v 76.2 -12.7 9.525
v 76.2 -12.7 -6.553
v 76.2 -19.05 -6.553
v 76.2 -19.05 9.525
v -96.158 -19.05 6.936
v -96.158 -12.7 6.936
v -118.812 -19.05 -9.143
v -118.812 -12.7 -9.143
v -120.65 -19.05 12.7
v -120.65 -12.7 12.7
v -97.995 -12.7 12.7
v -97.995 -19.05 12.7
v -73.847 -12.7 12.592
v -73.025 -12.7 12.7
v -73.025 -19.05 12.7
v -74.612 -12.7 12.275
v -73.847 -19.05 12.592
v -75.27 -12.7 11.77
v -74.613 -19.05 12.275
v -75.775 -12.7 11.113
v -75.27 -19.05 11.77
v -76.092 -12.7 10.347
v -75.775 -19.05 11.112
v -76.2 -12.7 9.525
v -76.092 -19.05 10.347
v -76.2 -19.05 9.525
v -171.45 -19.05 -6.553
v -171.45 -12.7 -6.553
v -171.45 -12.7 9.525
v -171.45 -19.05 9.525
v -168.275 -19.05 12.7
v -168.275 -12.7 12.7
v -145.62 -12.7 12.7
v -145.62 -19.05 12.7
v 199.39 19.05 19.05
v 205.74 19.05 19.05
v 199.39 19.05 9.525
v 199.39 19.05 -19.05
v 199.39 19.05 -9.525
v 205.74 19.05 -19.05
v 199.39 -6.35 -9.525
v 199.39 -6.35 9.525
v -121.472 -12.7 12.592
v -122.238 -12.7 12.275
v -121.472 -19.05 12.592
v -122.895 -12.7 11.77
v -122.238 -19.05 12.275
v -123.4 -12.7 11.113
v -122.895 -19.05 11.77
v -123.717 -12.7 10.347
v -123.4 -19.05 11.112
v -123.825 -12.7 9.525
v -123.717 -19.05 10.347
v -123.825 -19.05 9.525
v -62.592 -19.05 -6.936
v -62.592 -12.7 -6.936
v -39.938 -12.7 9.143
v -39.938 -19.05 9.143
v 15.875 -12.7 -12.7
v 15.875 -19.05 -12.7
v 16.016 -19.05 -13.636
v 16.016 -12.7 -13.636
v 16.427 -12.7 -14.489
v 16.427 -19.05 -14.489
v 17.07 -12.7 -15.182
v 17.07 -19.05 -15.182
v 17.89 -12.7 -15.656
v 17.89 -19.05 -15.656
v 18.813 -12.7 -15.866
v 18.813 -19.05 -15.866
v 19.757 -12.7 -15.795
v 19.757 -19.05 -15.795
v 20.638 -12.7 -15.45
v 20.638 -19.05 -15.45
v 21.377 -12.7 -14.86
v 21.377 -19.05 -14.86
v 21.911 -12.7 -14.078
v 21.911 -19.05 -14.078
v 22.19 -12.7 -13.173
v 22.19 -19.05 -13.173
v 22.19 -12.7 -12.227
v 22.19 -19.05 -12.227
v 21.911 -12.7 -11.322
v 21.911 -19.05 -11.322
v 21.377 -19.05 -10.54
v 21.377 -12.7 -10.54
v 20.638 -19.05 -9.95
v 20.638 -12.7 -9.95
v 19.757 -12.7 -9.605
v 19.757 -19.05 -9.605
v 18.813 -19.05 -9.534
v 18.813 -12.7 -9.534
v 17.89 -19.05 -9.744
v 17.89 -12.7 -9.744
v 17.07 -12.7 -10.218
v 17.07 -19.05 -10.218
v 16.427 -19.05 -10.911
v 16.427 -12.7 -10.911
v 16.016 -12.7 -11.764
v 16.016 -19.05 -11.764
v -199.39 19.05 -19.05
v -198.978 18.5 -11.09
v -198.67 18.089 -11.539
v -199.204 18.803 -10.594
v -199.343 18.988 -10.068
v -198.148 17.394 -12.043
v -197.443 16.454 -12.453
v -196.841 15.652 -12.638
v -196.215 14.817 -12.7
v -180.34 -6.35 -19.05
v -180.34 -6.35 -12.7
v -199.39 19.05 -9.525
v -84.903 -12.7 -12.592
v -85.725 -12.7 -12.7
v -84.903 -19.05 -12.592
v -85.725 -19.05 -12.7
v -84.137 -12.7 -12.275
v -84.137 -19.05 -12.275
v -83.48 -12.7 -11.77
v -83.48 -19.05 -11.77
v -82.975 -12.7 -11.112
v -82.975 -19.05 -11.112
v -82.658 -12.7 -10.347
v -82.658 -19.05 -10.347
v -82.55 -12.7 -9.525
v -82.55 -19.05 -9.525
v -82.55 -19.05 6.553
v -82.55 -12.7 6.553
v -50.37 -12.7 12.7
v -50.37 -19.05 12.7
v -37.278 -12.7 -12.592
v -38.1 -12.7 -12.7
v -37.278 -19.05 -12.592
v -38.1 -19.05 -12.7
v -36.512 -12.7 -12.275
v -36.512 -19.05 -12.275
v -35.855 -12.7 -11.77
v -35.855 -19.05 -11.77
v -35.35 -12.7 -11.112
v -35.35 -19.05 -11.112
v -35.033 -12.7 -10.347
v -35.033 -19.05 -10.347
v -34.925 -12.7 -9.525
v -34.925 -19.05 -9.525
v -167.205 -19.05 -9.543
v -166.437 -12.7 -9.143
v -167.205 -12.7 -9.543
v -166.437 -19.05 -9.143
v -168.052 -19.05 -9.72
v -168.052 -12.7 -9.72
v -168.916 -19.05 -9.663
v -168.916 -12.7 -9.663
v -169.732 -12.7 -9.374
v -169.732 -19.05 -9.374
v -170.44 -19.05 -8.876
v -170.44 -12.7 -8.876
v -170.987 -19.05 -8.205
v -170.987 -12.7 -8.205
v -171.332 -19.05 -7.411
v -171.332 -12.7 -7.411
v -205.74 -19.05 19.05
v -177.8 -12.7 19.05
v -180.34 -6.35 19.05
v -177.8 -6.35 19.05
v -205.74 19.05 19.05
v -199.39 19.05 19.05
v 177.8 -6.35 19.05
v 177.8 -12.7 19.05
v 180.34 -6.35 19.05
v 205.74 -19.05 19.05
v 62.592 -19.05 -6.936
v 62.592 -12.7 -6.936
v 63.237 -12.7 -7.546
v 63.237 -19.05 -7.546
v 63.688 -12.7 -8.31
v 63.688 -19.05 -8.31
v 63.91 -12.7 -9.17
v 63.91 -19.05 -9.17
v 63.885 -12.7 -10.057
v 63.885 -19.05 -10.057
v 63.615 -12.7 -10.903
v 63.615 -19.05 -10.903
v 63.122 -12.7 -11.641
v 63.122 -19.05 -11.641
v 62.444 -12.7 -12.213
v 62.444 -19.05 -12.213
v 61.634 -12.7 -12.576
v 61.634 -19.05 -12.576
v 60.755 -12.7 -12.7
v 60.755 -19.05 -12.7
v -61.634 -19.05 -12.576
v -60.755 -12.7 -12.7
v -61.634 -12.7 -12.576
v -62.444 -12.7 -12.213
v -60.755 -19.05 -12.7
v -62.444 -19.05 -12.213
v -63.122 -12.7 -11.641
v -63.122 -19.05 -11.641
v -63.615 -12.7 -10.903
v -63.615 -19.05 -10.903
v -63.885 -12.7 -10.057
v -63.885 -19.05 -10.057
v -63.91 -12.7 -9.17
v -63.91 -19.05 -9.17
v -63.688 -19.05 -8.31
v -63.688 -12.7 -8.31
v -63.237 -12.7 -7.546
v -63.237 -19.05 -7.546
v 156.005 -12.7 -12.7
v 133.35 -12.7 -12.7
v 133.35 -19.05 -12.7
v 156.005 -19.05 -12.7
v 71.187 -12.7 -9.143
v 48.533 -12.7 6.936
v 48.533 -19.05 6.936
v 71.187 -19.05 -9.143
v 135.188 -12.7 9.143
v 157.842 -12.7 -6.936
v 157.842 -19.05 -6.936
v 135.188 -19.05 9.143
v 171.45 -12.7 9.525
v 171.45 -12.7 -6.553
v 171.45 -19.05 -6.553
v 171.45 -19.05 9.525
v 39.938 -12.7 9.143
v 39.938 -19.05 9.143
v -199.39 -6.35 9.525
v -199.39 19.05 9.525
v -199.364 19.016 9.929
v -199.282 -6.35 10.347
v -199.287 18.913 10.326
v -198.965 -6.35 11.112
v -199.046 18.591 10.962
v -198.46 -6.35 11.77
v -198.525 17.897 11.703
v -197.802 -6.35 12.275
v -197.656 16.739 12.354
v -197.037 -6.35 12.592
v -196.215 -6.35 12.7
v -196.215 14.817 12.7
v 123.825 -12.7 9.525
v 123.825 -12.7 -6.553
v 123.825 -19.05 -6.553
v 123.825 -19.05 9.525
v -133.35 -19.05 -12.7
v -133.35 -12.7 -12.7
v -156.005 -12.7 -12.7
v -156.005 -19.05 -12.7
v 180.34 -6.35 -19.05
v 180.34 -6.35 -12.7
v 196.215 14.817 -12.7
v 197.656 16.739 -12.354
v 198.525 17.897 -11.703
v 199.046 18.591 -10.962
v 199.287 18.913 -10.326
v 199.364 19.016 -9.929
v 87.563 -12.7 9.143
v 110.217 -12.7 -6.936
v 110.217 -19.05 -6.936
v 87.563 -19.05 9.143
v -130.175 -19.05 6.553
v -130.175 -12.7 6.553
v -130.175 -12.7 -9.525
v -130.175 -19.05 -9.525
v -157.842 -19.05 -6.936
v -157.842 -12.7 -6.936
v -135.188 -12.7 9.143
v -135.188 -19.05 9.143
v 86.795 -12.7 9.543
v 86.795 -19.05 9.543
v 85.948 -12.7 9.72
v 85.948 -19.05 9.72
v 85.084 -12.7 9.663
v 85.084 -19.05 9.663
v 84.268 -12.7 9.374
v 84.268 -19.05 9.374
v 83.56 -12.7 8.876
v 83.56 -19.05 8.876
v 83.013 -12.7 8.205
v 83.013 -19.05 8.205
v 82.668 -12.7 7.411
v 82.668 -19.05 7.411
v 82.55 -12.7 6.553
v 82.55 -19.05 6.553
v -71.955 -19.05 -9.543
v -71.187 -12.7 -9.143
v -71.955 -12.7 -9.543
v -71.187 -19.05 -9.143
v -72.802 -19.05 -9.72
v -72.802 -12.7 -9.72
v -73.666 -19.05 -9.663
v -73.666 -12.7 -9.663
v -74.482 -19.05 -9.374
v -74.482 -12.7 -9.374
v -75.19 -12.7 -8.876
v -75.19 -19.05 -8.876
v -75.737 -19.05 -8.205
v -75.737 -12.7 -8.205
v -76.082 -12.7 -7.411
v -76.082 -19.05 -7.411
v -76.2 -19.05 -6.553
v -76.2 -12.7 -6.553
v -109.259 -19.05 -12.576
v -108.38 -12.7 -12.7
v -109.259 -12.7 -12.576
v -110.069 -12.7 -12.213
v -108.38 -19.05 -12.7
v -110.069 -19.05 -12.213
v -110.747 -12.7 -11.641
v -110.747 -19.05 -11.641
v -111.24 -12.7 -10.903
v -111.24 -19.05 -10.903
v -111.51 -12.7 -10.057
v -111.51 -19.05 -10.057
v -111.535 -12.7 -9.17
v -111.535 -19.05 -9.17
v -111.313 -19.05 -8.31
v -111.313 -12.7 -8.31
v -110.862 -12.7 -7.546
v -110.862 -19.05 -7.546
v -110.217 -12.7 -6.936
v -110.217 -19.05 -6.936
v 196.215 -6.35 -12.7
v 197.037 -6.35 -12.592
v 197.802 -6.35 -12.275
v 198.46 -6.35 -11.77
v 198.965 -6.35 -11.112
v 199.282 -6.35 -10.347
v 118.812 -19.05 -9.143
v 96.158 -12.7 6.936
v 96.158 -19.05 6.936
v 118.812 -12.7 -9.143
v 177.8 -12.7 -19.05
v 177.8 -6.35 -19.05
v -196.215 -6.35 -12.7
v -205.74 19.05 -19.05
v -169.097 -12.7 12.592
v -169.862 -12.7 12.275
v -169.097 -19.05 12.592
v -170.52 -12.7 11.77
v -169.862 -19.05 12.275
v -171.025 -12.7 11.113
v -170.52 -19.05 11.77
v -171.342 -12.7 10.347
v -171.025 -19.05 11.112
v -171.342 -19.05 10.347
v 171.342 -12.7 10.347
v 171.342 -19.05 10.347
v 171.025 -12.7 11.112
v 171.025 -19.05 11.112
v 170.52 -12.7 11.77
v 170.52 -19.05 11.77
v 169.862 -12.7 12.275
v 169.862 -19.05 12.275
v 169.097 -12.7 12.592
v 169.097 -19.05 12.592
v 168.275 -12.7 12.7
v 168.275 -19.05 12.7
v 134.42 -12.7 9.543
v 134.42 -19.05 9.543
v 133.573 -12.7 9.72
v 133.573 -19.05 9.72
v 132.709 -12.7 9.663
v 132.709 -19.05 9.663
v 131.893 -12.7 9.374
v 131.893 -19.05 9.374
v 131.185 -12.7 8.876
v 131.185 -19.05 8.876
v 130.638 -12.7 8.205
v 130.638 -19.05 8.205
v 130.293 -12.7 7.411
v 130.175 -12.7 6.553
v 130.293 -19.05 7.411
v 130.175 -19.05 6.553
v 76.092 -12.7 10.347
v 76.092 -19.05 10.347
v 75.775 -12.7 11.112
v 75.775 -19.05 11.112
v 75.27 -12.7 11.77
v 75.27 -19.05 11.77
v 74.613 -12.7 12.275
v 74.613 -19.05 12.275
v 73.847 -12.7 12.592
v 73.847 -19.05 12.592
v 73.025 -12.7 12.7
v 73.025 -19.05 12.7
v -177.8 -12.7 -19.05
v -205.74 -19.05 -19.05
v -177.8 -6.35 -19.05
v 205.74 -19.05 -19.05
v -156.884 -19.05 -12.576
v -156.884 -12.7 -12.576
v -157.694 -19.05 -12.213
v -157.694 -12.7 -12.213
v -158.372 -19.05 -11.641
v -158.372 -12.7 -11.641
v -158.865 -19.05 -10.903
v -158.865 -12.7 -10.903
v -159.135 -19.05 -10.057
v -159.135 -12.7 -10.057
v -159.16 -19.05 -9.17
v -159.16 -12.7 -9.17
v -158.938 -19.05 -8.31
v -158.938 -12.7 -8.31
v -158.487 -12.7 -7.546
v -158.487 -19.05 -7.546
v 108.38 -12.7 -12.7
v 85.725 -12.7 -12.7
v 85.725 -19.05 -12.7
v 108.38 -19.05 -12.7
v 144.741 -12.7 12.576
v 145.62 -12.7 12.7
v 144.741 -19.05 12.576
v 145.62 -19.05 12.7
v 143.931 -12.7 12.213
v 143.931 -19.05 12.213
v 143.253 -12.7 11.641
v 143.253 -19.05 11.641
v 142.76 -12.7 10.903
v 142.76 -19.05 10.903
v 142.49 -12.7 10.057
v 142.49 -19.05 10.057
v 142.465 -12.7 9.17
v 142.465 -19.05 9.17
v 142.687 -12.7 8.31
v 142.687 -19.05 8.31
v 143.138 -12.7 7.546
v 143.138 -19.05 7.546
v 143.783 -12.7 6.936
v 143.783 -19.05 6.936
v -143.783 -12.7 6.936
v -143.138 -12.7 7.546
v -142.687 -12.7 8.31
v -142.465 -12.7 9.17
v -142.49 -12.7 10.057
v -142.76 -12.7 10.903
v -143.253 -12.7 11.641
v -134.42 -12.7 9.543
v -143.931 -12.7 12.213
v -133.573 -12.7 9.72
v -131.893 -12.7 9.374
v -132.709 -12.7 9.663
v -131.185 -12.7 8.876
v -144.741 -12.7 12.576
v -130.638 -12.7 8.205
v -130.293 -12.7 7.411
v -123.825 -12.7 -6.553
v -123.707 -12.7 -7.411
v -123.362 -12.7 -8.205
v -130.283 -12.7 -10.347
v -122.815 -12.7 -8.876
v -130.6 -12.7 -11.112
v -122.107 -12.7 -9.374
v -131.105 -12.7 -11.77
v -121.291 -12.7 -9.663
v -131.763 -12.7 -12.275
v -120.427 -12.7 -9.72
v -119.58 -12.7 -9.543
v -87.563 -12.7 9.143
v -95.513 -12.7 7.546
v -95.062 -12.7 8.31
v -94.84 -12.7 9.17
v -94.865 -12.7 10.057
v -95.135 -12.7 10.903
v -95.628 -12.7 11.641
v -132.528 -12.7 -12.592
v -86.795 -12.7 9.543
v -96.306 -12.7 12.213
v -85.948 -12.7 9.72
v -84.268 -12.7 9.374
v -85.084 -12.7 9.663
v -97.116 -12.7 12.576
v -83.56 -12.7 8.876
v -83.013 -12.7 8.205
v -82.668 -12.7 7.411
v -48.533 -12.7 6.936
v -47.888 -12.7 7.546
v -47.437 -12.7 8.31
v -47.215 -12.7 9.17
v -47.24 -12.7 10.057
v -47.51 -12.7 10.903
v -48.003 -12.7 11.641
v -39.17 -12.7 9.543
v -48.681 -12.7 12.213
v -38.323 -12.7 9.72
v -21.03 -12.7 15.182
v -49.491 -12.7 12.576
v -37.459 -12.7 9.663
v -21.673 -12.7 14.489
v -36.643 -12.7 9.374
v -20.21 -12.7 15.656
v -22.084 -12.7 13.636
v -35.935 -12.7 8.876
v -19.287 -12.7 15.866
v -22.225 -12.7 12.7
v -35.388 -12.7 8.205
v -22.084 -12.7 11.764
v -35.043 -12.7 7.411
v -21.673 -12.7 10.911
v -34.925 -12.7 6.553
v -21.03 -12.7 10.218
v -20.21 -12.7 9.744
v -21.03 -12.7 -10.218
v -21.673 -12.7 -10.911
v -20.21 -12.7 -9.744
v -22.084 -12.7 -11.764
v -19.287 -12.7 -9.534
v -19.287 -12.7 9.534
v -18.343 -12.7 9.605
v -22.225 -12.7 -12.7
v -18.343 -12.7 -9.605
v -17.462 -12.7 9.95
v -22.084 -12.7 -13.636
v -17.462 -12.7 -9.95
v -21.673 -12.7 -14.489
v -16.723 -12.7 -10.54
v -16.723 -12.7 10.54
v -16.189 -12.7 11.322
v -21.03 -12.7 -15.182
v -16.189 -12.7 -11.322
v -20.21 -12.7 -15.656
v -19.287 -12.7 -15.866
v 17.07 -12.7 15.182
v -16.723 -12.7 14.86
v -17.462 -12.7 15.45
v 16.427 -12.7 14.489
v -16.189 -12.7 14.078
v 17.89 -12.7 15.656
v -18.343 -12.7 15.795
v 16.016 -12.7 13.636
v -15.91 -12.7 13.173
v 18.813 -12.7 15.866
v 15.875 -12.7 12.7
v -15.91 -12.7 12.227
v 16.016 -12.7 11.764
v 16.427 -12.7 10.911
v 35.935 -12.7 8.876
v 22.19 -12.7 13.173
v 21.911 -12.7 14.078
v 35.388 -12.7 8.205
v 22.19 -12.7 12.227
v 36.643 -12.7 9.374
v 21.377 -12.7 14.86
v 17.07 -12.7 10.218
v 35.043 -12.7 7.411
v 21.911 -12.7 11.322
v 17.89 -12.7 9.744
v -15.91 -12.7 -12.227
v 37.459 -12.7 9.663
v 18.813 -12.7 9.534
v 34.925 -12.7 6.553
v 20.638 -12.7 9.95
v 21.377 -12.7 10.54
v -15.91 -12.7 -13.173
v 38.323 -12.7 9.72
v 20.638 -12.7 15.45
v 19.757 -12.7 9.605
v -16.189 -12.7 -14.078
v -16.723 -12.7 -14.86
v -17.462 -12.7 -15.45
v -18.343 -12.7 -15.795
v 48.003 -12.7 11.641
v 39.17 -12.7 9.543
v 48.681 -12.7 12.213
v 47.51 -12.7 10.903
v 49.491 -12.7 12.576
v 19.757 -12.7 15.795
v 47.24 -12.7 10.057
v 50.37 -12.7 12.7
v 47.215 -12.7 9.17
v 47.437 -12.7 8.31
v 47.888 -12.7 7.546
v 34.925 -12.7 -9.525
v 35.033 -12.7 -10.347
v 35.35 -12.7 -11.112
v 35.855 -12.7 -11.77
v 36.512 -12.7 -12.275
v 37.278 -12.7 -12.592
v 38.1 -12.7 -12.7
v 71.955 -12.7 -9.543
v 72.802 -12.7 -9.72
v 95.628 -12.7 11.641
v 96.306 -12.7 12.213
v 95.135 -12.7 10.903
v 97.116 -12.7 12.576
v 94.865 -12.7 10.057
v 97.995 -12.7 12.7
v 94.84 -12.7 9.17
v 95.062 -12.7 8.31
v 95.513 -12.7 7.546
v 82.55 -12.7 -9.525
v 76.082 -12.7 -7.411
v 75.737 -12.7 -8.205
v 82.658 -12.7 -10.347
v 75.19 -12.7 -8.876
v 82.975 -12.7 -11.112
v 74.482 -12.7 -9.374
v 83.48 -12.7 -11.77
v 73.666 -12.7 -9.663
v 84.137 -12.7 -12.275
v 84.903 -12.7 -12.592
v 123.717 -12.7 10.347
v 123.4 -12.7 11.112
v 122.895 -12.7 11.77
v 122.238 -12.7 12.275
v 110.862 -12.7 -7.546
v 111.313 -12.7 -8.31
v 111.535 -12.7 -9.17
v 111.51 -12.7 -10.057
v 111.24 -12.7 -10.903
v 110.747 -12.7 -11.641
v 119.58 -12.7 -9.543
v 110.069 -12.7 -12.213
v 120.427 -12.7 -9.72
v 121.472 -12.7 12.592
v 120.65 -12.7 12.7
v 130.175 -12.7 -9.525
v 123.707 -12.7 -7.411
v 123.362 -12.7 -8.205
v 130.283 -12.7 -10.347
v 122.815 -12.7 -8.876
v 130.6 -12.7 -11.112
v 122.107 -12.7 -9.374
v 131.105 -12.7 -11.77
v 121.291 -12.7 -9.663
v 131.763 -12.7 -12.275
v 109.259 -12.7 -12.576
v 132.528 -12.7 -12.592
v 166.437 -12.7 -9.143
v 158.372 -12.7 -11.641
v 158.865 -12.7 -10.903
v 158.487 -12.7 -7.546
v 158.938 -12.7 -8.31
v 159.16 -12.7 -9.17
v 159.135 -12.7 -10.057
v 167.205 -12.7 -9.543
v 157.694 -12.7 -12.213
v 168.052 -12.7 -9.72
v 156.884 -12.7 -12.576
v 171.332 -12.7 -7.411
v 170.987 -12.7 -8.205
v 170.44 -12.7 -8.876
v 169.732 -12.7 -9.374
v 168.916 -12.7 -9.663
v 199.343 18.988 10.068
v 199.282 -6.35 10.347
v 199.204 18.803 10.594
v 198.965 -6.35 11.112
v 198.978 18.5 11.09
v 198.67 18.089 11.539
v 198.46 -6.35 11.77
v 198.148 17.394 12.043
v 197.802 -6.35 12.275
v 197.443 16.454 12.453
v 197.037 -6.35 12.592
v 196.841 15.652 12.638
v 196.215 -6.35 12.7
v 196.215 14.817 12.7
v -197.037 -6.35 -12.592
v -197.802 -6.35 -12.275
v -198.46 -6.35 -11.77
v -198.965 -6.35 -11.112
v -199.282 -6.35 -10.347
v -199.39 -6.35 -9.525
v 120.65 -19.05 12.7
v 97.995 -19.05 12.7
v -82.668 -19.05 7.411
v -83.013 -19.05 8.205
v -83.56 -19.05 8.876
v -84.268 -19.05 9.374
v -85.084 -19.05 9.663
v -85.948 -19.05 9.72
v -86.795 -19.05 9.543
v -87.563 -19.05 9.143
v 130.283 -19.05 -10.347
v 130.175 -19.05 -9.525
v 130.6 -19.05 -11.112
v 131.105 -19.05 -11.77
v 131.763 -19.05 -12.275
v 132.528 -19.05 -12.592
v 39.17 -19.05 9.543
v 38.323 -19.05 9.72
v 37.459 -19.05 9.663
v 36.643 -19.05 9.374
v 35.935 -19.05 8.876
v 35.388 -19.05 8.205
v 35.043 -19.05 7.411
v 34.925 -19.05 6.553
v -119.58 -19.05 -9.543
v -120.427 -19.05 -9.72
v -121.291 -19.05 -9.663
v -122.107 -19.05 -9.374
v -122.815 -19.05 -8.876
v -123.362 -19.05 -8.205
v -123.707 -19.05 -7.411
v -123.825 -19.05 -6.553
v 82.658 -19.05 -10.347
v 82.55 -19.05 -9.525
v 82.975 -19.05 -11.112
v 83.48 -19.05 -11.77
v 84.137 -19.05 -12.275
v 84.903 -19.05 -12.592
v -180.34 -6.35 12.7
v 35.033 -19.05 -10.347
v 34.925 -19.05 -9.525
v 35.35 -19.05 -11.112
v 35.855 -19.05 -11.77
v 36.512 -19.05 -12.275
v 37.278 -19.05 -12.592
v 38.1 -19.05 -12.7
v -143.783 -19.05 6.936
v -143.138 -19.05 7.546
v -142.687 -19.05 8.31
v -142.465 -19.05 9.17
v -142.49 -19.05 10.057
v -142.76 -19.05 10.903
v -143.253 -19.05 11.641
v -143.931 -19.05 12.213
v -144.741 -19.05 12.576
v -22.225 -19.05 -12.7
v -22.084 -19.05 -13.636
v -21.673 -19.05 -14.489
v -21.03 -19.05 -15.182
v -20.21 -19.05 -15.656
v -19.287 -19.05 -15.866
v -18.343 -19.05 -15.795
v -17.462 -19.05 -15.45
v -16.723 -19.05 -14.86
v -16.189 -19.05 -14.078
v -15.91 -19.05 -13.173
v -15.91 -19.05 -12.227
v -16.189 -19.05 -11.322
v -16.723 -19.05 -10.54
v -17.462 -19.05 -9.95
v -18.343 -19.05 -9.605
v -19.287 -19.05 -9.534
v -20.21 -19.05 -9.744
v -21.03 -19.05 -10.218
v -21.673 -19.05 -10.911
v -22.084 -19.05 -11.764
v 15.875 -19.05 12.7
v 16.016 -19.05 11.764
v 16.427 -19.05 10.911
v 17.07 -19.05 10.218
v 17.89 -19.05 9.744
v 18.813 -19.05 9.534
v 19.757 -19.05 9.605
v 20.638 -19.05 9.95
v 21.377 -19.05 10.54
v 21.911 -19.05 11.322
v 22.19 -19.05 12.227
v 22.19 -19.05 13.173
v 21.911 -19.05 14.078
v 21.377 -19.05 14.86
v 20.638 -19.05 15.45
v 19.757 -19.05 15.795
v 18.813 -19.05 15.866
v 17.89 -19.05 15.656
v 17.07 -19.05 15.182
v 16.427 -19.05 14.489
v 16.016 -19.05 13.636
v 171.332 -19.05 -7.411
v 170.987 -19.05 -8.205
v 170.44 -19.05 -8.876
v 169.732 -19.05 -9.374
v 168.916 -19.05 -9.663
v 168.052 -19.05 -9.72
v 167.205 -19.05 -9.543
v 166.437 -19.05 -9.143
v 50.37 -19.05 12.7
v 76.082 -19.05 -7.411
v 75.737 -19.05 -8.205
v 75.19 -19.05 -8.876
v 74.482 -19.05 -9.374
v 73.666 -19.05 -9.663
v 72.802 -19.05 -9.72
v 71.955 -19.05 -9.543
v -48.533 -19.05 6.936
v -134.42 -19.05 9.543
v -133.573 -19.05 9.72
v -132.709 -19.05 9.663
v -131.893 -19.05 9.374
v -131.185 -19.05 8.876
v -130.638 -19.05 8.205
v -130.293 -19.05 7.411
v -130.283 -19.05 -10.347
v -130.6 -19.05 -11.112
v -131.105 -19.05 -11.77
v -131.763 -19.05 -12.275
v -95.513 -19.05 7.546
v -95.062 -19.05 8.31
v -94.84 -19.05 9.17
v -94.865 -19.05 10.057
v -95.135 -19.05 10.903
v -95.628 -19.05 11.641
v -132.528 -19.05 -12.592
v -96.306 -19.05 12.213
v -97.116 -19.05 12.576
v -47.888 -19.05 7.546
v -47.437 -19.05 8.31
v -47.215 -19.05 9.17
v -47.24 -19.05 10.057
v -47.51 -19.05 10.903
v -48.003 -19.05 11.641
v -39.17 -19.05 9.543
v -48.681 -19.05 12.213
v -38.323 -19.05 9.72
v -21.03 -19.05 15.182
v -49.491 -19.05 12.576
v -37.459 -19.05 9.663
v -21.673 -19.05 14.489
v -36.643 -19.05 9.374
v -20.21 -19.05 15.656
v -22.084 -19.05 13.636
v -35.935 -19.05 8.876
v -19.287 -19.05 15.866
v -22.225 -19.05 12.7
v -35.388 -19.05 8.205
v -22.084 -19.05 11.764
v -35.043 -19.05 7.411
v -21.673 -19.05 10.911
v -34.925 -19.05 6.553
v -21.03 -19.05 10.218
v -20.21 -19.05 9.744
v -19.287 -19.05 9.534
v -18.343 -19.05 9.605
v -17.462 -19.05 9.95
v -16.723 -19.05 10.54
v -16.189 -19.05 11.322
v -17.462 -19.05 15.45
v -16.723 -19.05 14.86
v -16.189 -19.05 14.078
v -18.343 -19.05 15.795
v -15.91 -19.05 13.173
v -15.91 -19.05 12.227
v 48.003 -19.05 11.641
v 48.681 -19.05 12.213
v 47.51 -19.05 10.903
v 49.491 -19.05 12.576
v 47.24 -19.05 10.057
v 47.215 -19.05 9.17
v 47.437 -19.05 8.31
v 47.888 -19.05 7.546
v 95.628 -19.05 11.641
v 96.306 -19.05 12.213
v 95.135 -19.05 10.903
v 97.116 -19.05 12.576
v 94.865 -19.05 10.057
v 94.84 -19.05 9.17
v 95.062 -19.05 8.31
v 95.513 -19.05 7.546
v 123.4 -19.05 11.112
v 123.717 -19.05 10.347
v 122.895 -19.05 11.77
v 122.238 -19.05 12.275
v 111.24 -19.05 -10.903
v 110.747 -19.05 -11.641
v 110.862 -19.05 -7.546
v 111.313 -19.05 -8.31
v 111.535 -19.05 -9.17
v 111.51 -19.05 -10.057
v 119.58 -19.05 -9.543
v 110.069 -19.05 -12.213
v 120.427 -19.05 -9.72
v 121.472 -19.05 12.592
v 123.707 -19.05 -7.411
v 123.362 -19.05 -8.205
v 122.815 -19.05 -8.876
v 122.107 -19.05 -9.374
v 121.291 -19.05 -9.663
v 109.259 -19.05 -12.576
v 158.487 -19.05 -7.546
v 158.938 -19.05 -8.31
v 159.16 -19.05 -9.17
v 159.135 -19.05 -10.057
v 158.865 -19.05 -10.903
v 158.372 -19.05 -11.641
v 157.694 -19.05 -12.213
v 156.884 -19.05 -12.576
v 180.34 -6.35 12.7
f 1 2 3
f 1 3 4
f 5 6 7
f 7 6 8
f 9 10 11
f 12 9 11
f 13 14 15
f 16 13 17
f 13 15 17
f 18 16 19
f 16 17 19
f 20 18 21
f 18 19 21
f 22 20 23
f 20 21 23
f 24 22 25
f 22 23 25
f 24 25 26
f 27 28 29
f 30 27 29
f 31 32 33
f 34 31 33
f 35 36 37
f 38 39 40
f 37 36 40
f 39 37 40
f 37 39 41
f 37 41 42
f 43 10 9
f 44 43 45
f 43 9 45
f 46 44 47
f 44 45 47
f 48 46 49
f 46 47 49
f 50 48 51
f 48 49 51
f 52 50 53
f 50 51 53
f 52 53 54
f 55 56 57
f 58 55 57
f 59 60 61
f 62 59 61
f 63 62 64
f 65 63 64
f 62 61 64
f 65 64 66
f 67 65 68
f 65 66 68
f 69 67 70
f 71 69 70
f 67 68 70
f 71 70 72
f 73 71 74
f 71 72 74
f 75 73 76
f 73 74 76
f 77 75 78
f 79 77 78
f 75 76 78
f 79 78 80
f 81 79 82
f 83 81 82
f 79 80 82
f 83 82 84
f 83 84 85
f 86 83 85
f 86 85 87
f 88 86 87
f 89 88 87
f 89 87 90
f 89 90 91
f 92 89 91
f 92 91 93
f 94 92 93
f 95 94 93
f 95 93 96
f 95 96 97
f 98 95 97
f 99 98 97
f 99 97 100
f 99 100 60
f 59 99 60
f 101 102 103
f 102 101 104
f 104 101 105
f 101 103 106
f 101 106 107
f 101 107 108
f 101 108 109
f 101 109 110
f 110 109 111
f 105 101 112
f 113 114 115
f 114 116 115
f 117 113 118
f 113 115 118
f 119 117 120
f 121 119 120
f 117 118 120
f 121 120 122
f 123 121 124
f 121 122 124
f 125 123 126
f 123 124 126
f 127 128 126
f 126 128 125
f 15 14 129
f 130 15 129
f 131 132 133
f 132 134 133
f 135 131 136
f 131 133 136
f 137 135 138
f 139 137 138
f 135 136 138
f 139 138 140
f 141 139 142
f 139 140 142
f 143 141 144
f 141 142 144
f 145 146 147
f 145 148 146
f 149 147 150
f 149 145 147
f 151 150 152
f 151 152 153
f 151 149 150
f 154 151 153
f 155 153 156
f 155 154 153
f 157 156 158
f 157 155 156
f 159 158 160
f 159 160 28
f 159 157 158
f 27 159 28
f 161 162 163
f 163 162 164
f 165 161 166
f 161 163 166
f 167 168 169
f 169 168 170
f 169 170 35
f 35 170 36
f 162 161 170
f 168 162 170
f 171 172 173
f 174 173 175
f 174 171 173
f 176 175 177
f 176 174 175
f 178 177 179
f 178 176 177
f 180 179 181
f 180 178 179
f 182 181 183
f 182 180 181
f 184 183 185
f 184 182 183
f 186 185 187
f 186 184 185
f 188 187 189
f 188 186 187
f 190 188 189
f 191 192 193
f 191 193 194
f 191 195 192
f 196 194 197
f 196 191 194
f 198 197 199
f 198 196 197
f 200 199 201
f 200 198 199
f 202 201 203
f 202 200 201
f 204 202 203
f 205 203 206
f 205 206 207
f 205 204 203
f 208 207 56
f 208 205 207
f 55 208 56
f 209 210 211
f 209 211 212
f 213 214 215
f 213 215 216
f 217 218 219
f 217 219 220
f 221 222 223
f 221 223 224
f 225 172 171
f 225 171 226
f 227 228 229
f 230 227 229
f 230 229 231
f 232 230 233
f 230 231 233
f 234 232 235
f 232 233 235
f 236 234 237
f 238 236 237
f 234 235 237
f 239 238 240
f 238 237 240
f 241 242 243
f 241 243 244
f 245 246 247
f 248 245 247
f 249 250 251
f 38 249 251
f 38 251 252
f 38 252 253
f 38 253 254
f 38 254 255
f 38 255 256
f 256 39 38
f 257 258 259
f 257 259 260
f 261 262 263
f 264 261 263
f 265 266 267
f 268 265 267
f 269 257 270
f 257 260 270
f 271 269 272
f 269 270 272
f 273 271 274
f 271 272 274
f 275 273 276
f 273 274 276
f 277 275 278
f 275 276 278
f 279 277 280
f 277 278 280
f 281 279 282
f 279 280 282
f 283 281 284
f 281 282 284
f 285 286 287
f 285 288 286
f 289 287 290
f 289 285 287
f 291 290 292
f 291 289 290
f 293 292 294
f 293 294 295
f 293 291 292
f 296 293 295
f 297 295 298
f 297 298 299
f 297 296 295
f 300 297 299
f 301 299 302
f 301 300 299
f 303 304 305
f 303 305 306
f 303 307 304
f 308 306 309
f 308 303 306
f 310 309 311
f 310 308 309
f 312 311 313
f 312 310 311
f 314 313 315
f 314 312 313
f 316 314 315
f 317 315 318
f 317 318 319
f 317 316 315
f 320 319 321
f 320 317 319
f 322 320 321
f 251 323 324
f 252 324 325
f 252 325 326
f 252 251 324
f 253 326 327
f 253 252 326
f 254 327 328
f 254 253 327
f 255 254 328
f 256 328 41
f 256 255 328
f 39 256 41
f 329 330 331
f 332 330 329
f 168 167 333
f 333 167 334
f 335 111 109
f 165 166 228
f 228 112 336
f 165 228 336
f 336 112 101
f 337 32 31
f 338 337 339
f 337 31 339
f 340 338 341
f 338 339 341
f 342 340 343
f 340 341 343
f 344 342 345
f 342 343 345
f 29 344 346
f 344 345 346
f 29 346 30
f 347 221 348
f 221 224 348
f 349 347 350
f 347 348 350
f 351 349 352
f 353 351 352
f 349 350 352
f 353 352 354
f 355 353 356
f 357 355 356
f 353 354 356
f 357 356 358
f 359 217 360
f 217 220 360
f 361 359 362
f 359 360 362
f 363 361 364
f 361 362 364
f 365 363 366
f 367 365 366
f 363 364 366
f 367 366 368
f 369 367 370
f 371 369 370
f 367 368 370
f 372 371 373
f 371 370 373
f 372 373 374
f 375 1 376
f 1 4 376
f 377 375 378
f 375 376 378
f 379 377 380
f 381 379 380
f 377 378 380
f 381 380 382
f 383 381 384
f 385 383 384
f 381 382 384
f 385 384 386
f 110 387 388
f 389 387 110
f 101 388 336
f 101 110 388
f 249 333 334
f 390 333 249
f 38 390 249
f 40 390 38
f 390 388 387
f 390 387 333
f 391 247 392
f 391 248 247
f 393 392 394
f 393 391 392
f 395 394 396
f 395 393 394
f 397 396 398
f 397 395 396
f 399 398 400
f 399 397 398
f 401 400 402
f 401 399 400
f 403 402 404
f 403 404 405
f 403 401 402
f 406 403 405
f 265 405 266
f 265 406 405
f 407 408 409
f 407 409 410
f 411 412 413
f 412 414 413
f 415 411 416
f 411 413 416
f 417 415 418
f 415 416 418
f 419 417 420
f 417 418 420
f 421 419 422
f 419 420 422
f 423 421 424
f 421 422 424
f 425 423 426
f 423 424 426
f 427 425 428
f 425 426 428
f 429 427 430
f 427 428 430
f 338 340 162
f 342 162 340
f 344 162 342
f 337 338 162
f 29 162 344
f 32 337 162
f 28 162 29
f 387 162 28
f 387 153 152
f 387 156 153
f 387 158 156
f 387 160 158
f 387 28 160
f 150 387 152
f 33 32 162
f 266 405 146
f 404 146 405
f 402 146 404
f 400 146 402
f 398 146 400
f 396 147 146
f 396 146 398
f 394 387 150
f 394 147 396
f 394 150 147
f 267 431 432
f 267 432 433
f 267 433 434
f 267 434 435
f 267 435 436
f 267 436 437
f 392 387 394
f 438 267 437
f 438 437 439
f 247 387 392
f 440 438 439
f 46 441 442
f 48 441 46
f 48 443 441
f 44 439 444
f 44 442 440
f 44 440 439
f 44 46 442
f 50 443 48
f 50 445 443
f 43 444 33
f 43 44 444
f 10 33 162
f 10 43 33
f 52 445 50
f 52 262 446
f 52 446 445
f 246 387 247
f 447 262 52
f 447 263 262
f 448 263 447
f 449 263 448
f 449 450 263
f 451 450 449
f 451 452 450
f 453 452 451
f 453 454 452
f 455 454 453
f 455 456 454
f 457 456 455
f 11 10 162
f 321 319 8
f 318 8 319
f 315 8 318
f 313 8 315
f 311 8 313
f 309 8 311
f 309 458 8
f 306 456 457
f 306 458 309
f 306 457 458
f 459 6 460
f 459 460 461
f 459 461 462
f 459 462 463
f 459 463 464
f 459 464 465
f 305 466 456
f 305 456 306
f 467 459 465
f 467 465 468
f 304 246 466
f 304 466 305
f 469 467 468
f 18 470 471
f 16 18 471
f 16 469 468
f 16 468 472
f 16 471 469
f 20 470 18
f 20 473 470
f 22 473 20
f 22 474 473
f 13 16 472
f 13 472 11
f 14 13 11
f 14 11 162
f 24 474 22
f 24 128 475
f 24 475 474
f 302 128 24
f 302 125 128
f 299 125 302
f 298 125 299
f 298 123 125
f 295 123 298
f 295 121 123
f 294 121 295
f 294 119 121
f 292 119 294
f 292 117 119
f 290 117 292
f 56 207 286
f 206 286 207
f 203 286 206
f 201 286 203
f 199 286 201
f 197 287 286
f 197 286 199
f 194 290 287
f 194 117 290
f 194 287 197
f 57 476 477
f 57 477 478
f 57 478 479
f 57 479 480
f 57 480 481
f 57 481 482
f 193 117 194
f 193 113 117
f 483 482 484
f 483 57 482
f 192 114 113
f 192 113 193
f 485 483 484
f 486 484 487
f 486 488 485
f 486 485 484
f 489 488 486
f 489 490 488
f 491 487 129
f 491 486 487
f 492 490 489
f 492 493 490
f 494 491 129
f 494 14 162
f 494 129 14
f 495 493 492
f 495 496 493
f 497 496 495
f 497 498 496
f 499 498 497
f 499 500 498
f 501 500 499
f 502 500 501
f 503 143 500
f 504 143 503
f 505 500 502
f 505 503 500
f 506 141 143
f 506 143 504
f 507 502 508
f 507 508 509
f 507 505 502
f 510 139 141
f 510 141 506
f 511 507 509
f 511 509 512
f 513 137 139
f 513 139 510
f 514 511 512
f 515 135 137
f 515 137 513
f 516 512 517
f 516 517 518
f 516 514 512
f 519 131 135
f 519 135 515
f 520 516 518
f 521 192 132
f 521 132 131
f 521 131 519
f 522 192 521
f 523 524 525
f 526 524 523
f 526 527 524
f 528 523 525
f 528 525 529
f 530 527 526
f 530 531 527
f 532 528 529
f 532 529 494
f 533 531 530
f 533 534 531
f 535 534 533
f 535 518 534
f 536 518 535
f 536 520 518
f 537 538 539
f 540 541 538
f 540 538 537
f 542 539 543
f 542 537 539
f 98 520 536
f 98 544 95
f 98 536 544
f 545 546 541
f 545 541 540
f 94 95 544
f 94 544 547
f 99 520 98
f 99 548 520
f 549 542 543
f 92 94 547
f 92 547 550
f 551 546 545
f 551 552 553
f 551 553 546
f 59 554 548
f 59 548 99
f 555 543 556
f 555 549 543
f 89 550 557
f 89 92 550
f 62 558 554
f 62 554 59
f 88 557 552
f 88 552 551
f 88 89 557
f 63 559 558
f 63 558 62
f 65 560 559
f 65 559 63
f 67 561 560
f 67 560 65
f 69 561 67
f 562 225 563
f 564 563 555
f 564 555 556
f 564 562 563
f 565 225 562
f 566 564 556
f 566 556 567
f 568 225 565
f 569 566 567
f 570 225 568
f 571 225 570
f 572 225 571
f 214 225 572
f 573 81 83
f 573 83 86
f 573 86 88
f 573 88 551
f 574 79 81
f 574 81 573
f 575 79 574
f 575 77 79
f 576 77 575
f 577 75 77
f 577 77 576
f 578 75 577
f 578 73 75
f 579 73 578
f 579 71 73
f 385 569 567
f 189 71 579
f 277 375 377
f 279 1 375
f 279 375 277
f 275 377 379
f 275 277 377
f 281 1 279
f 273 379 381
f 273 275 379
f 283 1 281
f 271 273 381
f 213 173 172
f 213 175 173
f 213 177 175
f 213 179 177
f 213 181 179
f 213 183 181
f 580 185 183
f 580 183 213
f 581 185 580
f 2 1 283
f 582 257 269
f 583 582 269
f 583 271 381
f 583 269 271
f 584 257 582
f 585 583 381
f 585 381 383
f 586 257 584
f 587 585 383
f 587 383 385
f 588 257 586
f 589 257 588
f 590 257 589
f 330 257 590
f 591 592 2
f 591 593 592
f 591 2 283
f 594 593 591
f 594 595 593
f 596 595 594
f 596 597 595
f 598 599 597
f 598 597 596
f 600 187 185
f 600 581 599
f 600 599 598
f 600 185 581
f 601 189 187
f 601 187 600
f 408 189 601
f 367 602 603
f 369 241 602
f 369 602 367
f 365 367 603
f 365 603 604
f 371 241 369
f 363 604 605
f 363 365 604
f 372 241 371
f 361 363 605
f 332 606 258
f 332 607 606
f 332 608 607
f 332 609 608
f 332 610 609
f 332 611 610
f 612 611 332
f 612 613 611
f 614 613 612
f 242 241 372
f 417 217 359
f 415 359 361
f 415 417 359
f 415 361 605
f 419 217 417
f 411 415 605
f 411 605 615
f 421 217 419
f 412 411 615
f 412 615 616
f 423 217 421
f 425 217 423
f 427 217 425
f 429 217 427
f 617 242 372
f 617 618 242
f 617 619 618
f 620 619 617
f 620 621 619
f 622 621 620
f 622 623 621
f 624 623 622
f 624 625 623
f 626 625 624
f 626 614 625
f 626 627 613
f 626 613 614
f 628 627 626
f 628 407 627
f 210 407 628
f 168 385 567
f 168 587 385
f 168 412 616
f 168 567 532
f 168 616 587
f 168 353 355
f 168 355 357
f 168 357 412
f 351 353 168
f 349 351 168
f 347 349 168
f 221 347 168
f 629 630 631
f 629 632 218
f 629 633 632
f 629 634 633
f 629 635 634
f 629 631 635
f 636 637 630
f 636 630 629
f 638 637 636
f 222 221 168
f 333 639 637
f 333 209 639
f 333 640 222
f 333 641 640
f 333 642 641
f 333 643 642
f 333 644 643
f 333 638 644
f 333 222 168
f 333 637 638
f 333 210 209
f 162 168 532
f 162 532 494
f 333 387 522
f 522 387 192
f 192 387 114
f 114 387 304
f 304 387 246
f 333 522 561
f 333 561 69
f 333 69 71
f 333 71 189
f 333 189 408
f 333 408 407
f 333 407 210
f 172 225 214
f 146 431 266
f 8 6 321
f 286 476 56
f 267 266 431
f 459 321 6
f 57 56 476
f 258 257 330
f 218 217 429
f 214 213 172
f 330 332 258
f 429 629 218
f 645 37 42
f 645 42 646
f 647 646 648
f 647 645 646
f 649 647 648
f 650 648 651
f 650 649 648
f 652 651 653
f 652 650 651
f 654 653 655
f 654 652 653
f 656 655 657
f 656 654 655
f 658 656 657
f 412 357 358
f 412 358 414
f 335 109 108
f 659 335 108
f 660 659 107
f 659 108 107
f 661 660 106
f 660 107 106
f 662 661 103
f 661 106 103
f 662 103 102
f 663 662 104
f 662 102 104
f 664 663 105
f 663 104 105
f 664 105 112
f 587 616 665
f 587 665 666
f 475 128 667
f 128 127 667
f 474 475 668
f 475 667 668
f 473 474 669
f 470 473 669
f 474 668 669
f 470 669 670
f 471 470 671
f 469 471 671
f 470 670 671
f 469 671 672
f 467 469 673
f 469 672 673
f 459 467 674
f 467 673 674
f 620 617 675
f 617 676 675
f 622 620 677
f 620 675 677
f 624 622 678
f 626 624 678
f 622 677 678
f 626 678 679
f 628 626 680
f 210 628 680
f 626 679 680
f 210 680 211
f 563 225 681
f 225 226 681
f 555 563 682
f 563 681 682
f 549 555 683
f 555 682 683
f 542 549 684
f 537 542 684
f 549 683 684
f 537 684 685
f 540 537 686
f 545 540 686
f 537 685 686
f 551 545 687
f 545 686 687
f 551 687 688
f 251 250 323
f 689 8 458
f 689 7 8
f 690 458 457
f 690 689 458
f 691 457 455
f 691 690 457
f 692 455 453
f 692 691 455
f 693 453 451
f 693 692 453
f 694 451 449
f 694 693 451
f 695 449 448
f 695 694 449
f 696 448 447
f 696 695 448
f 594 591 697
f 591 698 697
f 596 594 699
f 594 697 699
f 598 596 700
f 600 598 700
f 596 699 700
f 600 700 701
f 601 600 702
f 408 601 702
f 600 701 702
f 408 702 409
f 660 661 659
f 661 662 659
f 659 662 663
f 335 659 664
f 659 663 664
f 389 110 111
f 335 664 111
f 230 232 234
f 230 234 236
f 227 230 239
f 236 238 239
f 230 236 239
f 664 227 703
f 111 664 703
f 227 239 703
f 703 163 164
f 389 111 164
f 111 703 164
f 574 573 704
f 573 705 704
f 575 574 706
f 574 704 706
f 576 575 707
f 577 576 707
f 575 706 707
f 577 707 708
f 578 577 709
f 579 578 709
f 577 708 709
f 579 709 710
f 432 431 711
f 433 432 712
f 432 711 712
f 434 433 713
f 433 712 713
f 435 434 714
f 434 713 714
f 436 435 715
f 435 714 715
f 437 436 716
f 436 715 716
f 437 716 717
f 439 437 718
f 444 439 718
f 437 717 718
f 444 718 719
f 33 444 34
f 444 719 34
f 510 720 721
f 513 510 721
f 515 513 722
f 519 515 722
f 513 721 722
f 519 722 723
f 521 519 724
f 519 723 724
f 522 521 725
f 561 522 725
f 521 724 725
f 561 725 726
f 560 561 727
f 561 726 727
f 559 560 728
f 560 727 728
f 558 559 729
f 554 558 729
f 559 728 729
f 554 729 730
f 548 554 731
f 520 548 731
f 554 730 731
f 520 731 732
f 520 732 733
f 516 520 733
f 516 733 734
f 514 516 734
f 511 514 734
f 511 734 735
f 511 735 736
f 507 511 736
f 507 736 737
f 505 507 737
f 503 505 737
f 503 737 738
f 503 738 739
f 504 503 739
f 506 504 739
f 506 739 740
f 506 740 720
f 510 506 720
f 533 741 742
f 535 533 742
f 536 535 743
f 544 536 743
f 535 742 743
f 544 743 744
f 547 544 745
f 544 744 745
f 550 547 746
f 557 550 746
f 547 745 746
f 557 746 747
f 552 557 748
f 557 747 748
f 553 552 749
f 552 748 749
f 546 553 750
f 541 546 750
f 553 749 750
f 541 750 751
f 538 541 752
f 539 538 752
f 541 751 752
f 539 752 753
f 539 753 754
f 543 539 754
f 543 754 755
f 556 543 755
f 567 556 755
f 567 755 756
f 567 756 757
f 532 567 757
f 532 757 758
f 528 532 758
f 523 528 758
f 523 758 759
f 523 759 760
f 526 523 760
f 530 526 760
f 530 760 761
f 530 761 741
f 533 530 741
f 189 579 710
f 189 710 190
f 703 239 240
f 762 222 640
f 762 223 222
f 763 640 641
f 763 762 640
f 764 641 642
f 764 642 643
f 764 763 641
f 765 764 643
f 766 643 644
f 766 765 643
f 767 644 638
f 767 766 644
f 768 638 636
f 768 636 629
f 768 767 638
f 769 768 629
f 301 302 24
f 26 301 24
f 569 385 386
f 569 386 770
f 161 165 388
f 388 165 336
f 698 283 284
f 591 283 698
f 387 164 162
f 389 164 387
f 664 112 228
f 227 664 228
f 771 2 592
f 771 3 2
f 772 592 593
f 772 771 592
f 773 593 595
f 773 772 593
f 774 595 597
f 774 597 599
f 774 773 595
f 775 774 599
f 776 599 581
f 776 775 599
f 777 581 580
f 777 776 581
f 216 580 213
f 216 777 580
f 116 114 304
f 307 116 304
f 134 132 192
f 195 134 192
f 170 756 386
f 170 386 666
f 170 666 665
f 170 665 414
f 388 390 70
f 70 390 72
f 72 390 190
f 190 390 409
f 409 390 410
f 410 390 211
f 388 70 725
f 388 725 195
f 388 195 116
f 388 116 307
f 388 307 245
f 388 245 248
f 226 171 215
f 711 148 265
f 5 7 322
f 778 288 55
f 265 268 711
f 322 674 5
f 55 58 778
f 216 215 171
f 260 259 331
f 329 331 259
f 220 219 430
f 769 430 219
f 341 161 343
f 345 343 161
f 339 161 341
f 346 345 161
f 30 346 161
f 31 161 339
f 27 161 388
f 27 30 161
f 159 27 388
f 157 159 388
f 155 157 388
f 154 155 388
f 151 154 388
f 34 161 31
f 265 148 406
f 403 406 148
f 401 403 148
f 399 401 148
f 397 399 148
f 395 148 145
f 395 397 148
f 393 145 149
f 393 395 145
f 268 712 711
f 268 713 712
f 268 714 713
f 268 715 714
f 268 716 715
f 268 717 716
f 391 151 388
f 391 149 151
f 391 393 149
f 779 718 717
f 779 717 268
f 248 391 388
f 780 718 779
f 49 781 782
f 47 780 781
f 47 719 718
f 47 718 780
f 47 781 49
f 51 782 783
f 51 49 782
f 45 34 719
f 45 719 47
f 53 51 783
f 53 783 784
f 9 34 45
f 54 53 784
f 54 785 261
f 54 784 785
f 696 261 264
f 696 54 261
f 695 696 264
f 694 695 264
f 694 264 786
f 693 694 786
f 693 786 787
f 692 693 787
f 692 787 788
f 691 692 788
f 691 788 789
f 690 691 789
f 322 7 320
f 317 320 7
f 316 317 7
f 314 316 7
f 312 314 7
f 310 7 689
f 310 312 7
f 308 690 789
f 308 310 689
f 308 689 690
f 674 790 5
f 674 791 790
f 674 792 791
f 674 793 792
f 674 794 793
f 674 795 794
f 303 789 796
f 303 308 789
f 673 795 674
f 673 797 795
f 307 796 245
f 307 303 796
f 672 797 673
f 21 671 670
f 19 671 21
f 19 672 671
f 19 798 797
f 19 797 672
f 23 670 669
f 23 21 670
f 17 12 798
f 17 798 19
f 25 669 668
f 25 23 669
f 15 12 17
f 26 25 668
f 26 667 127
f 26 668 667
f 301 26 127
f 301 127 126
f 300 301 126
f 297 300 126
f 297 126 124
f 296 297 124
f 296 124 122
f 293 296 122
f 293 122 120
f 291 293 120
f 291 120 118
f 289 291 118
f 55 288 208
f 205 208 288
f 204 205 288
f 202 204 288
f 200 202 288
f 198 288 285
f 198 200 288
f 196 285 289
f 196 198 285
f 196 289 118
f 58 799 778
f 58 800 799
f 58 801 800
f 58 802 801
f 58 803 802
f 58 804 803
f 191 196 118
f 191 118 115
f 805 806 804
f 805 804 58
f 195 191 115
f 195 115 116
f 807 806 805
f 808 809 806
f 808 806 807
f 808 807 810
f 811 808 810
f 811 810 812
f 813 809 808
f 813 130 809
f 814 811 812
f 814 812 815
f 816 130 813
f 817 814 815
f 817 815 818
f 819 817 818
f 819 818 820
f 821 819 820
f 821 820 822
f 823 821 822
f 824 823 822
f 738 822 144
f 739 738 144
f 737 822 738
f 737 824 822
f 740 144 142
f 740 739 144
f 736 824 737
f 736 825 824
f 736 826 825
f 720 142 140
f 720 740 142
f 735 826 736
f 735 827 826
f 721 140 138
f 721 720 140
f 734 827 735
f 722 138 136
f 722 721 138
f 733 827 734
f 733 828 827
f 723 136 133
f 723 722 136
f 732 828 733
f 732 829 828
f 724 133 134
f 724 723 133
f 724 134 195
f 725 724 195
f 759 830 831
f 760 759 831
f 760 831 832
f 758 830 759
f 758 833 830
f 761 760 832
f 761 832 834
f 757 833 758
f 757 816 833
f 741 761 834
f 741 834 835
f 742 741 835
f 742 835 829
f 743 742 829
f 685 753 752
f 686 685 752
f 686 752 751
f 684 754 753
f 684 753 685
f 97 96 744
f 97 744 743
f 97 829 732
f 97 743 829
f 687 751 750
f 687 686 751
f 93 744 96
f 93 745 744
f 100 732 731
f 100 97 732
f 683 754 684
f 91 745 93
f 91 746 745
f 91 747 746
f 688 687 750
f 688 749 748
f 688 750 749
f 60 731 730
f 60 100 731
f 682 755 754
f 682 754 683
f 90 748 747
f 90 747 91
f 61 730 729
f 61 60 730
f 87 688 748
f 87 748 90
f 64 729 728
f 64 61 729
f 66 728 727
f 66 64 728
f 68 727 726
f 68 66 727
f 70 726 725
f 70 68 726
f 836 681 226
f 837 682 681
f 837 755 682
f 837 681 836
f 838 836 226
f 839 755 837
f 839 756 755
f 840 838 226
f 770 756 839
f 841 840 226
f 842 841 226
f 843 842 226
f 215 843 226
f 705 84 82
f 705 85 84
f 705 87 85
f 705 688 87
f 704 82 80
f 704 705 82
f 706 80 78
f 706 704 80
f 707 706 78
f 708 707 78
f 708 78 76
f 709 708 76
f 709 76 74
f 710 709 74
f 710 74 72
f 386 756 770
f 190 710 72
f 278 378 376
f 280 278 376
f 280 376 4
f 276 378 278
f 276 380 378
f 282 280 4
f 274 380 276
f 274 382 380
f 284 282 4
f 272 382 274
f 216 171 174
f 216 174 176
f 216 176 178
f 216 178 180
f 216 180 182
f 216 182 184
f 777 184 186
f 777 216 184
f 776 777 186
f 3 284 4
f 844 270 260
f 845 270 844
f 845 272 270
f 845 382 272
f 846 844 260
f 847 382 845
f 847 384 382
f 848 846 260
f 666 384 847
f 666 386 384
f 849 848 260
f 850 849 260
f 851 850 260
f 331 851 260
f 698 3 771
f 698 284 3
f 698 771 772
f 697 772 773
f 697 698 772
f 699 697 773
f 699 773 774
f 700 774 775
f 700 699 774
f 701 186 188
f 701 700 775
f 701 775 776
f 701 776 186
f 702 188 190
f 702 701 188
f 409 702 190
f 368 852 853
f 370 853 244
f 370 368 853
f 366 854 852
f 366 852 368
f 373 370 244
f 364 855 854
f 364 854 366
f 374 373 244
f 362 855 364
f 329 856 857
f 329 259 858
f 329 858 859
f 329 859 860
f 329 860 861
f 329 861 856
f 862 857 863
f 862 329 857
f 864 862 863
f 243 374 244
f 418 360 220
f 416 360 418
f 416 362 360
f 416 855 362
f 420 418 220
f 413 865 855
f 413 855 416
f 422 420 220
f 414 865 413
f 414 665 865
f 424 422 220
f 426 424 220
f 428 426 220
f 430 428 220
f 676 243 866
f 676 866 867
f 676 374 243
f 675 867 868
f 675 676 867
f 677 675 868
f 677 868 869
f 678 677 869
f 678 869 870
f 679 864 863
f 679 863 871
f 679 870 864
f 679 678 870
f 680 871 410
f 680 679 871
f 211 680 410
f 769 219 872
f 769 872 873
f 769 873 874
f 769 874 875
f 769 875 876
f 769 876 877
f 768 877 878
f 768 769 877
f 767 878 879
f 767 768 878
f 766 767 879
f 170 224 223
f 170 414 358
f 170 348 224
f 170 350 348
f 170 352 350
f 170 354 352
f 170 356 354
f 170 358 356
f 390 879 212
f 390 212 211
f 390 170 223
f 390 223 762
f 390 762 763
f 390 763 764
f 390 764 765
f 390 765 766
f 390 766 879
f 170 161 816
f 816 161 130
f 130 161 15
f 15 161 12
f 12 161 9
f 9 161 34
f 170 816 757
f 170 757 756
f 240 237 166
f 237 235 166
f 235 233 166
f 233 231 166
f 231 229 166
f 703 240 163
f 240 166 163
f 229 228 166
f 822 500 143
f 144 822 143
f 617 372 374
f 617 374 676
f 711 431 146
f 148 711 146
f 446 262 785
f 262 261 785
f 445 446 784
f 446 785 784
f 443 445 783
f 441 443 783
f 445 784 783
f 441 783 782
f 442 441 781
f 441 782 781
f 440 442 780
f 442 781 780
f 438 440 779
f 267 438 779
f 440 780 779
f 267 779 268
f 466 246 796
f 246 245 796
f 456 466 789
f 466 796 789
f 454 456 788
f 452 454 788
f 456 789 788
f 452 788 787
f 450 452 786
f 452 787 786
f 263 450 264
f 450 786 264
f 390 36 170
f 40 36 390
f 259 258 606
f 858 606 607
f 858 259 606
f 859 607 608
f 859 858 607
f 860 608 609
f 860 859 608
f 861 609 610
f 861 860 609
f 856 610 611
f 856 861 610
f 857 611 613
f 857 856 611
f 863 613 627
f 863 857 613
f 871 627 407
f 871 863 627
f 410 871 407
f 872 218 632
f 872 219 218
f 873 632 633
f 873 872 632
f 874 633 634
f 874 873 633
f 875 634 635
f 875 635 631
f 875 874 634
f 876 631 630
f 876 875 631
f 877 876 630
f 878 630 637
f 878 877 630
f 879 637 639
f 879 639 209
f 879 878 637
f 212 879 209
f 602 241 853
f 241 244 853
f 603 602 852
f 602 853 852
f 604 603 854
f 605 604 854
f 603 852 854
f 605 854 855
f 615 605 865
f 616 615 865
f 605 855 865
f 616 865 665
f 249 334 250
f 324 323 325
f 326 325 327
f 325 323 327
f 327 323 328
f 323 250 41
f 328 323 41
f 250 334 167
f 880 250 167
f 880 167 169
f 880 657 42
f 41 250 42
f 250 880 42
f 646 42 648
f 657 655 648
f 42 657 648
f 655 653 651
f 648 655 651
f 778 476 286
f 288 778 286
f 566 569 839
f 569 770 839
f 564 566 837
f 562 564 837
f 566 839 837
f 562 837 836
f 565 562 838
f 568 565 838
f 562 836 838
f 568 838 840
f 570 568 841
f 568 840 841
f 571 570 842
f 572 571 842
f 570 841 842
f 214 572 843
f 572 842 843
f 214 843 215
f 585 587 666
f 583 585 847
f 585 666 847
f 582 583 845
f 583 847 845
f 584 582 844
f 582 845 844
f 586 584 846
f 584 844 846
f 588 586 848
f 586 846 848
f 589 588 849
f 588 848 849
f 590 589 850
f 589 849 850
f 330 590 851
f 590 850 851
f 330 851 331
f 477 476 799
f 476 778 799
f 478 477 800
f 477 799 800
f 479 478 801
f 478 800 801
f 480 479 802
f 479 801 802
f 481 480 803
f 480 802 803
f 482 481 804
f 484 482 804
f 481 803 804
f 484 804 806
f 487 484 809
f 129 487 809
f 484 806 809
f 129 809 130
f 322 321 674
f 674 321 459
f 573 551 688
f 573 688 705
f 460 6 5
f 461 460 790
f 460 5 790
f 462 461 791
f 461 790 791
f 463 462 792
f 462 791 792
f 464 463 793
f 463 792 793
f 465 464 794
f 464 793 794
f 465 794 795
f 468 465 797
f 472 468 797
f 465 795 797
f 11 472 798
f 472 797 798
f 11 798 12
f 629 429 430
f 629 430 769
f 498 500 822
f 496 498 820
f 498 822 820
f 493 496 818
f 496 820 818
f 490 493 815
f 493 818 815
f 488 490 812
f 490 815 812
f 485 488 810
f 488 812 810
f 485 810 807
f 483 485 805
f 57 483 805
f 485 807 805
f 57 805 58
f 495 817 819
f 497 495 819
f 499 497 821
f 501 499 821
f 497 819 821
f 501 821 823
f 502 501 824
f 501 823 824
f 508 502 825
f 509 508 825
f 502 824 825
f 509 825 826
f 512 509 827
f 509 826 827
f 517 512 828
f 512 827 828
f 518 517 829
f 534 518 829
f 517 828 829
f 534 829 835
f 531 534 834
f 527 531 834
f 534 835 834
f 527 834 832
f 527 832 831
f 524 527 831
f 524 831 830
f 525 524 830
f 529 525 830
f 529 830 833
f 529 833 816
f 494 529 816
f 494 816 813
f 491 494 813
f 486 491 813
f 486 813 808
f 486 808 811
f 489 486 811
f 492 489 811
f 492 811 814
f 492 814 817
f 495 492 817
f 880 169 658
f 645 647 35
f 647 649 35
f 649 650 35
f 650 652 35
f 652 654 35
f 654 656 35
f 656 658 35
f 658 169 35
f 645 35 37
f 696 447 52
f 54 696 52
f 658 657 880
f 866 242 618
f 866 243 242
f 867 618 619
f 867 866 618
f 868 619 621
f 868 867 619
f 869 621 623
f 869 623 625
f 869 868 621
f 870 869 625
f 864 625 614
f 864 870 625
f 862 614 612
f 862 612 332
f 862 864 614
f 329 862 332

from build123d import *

# Parameters (mm, degrees)
SKETCH1_W                   = 38.1
SKETCH1_H                   = 38.1
BOSS_EXTRUDE1_DEPTH         = 205.74
CUT_EXTRUDE1_REACH          = 212.103
CUT_EXTRUDE2_DEPTH          = 25.4
F_1_4_0_25_DIAMETER_HOLE1_D = 6.35
SKETCH10_W                  = 355.6
SKETCH10_H                  = 38.1
CUT_EXTRUDE3_DEPTH          = 6.35
CUT_EXTRUDE4_REACH          = 211.045
FILLET1_R                   = 3.175
FILLET1_OF_MIRROR1_R        = 3.175


with BuildPart() as part:
    # Sketch1 → Boss-Extrude1 (new, symmetric)
    with BuildSketch(Plane(origin=(0, 0, 0), x_dir=(0, 0, -1), z_dir=(1, 0, 0))):
        Rectangle(SKETCH1_W, SKETCH1_H)
    extrude(amount=BOSS_EXTRUDE1_DEPTH, both=True)

    # Sketch3 → Cut-Extrude1 (cut, up to next)
    with BuildSketch(Plane.XY.offset(19.05), mode=Mode.PRIVATE) as cut_extrude1_sk1:
        Polygon((-199.39, 19.05), (-180.34, -6.35), (180.34, -6.35), (199.39, 19.05), align=None)
    cut_extrude1_tool1 = extrude(cut_extrude1_sk1.sketch, amount=-CUT_EXTRUDE1_REACH, mode=Mode.PRIVATE) & part.part
    add(cut_extrude1_tool1.solids().sort_by_distance((0, 6.562375, 19.05))[0], mode=Mode.SUBTRACT)

    # Sketch4 → Cut-Extrude2 (cut)
    with BuildSketch(Plane(origin=(0, 19.05, 0), x_dir=(1, 0, 0), z_dir=(0, 1, 0))):
        with BuildLine():
            Line((-199.39, 9.525), (-199.39, -9.525))
            ThreePointArc((-199.39, -9.525), (-198.46006403, -11.77006403), (-196.215, -12.7))
            Line((-196.215, -12.7), (-148.59, -12.7))
            Line((-148.59, -12.7), (-148.59, 12.7))
            Line((-148.59, 12.7), (-196.215, 12.7))
            ThreePointArc((-196.215, 12.7), (-198.46006403, 11.77006403), (-199.39, 9.525))
        make_face()
        with BuildLine():
            Line((148.59, 12.7), (196.215, 12.7))
            ThreePointArc((196.215, 12.7), (198.46006403, 11.77006403), (199.39, 9.525))
            Line((199.39, 9.525), (199.39, -9.525))
            ThreePointArc((199.39, -9.525), (198.46006403, -11.77006403), (196.215, -12.7))
            Line((196.215, -12.7), (148.59, -12.7))
            Line((148.59, -12.7), (148.59, 12.7))
        make_face()
    extrude(amount=-CUT_EXTRUDE2_DEPTH, mode=Mode.SUBTRACT)

    # 1/4 (0.25) Diameter Hole1 (through all)
    with Locations(Plane(origin=(0, -6.35, 0), x_dir=(1, 0, 0), z_dir=(0, 1, 0))):
        with Locations((19.05, -12.7), (-19.05, 12.7), (-19.05, -12.7), (19.05, 12.7)):
            Hole(F_1_4_0_25_DIAMETER_HOLE1_D / 2)

    # Sketch10 → Cut-Extrude3 (cut)
    with BuildSketch(Plane(origin=(0, -6.35, 0), x_dir=(1, 0, 0), z_dir=(0, 1, 0))):
        Rectangle(SKETCH10_W, SKETCH10_H)
    extrude(amount=-CUT_EXTRUDE3_DEPTH, mode=Mode.SUBTRACT)

    # Sketch11 → Cut-Extrude4 (cut, up to next)
    with BuildSketch(Plane(origin=(0, -12.7, 0), x_dir=(1, 0, 0), z_dir=(0, 1, 0)), mode=Mode.PRIVATE) as cut_extrude4_sk1:
        Polygon((-171.45, 12.7), (-171.45, -12.7), (-135.660813869, -12.7), align=None)
    cut_extrude4_tool1 = extrude(cut_extrude4_sk1.sketch, amount=-CUT_EXTRUDE4_REACH, mode=Mode.PRIVATE) & part.part
    # Sketch11 → Cut-Extrude4 (cut, up to next)
    with BuildSketch(Plane(origin=(0, -12.7, 0), x_dir=(1, 0, 0), z_dir=(0, 1, 0)), mode=Mode.PRIVATE) as cut_extrude4_sk2:
        Polygon((-165.964186131, 12.7), (-130.175, -12.7), (-130.175, 12.7), align=None)
    cut_extrude4_tool2 = extrude(cut_extrude4_sk2.sketch, amount=-CUT_EXTRUDE4_REACH, mode=Mode.PRIVATE) & part.part
    # Sketch11 → Cut-Extrude4 (cut, up to next)
    with BuildSketch(Plane(origin=(0, -12.7, 0), x_dir=(1, 0, 0), z_dir=(0, 1, 0)), mode=Mode.PRIVATE) as cut_extrude4_sk3:
        Polygon((-123.825, 12.7), (-123.825, -12.7), (-88.035813869, -12.7), align=None)
    cut_extrude4_tool3 = extrude(cut_extrude4_sk3.sketch, amount=-CUT_EXTRUDE4_REACH, mode=Mode.PRIVATE) & part.part
    # Sketch11 → Cut-Extrude4 (cut, up to next)
    with BuildSketch(Plane(origin=(0, -12.7, 0), x_dir=(1, 0, 0), z_dir=(0, 1, 0)), mode=Mode.PRIVATE) as cut_extrude4_sk4:
        Polygon((-118.339186131, 12.7), (-82.55, -12.7), (-82.55, 12.7), align=None)
    cut_extrude4_tool4 = extrude(cut_extrude4_sk4.sketch, amount=-CUT_EXTRUDE4_REACH, mode=Mode.PRIVATE) & part.part
    # Sketch11 → Cut-Extrude4 (cut, up to next)
    with BuildSketch(Plane(origin=(0, -12.7, 0), x_dir=(1, 0, 0), z_dir=(0, 1, 0)), mode=Mode.PRIVATE) as cut_extrude4_sk5:
        Polygon((-76.2, 12.7), (-76.2, -12.7), (-40.410813869, -12.7), align=None)
    cut_extrude4_tool5 = extrude(cut_extrude4_sk5.sketch, amount=-CUT_EXTRUDE4_REACH, mode=Mode.PRIVATE) & part.part
    # Sketch11 → Cut-Extrude4 (cut, up to next)
    with BuildSketch(Plane(origin=(0, -12.7, 0), x_dir=(1, 0, 0), z_dir=(0, 1, 0)), mode=Mode.PRIVATE) as cut_extrude4_sk6:
        Polygon((-70.714186131, 12.7), (-34.925, -12.7), (-34.925, 12.7), align=None)
    cut_extrude4_tool6 = extrude(cut_extrude4_sk6.sketch, amount=-CUT_EXTRUDE4_REACH, mode=Mode.PRIVATE) & part.part
    cut_extrude4_1 = cut_extrude4_tool1.solids().sort_by_distance((-159.520271, -12.7, 4.233333))[0]
    add(cut_extrude4_1, mode=Mode.SUBTRACT)
    cut_extrude4_2 = cut_extrude4_tool2.solids().sort_by_distance((-142.104729, -12.7, -4.233333))[0]
    add(cut_extrude4_2, mode=Mode.SUBTRACT)
    cut_extrude4_3 = cut_extrude4_tool3.solids().sort_by_distance((-111.895271, -12.7, 4.233333))[0]
    add(cut_extrude4_3, mode=Mode.SUBTRACT)
    cut_extrude4_4 = cut_extrude4_tool4.solids().sort_by_distance((-94.479729, -12.7, -4.233333))[0]
    add(cut_extrude4_4, mode=Mode.SUBTRACT)
    cut_extrude4_5 = cut_extrude4_tool5.solids().sort_by_distance((-64.270271, -12.7, 4.233333))[0]
    add(cut_extrude4_5, mode=Mode.SUBTRACT)
    cut_extrude4_6 = cut_extrude4_tool6.solids().sort_by_distance((-46.854729, -12.7, -4.233333))[0]
    add(cut_extrude4_6, mode=Mode.SUBTRACT)
    cut_extrude4 = cut_extrude4_1 + cut_extrude4_2 + cut_extrude4_3 + cut_extrude4_4 + cut_extrude4_5 + cut_extrude4_6  # Cut-Extrude4 as one shape, for the pattern or mirror that repeats it

    # Fillet1
    fillet1_edges = [part.edges().sort_by_distance(p)[0] for p in [
        (-171.45, -15.875, -12.7),
        (-135.660813869, -15.875, 12.7),
        (-171.45, -15.875, 12.7),
        (-165.964186131, -15.875, -12.7),
        (-130.175, -15.875, -12.7),
        (-130.175, -15.875, 12.7),
        (-123.825, -15.875, -12.7),
        (-88.035813869, -15.875, 12.7),
        (-123.825, -15.875, 12.7),
        (-118.339186131, -15.875, -12.7),
        (-82.55, -15.875, -12.7),
        (-82.55, -15.875, 12.7),
        (-76.2, -15.875, -12.7),
        (-40.410813869, -15.875, 12.7),
        (-76.2, -15.875, 12.7),
        (-70.714186131, -15.875, -12.7),
        (-34.925, -15.875, -12.7),
        (-34.925, -15.875, 12.7),
    ]]
    fillet(fillet1_edges, radius=FILLET1_R)

    # Mirror1: Cut-Extrude4 across plane
    add(cut_extrude4.mirror(Plane(origin=(0, 0, 0), x_dir=(0, 0, 1), z_dir=(1, 0, 0))), mode=Mode.SUBTRACT)

    # Fillet1 of Mirror1
    fillet1_of_mirror1_edges = [part.edges().sort_by_distance(p)[0] for p in [
        (171.45, -15.875, -12.7),
        (135.660813869, -15.875, 12.7),
        (171.45, -15.875, 12.7),
        (165.964186131, -15.875, -12.7),
        (130.175, -15.875, -12.7),
        (130.175, -15.875, 12.7),
        (123.825, -15.875, -12.7),
        (88.035813869, -15.875, 12.7),
        (123.825, -15.875, 12.7),
        (118.339186131, -15.875, -12.7),
        (82.55, -15.875, -12.7),
        (82.55, -15.875, 12.7),
        (76.2, -15.875, -12.7),
        (40.410813869, -15.875, 12.7),
        (76.2, -15.875, 12.7),
        (70.714186131, -15.875, -12.7),
        (34.925, -15.875, -12.7),
        (34.925, -15.875, 12.7),
    ]]
    fillet(fillet1_of_mirror1_edges, radius=FILLET1_OF_MIRROR1_R)


solid = part.part
